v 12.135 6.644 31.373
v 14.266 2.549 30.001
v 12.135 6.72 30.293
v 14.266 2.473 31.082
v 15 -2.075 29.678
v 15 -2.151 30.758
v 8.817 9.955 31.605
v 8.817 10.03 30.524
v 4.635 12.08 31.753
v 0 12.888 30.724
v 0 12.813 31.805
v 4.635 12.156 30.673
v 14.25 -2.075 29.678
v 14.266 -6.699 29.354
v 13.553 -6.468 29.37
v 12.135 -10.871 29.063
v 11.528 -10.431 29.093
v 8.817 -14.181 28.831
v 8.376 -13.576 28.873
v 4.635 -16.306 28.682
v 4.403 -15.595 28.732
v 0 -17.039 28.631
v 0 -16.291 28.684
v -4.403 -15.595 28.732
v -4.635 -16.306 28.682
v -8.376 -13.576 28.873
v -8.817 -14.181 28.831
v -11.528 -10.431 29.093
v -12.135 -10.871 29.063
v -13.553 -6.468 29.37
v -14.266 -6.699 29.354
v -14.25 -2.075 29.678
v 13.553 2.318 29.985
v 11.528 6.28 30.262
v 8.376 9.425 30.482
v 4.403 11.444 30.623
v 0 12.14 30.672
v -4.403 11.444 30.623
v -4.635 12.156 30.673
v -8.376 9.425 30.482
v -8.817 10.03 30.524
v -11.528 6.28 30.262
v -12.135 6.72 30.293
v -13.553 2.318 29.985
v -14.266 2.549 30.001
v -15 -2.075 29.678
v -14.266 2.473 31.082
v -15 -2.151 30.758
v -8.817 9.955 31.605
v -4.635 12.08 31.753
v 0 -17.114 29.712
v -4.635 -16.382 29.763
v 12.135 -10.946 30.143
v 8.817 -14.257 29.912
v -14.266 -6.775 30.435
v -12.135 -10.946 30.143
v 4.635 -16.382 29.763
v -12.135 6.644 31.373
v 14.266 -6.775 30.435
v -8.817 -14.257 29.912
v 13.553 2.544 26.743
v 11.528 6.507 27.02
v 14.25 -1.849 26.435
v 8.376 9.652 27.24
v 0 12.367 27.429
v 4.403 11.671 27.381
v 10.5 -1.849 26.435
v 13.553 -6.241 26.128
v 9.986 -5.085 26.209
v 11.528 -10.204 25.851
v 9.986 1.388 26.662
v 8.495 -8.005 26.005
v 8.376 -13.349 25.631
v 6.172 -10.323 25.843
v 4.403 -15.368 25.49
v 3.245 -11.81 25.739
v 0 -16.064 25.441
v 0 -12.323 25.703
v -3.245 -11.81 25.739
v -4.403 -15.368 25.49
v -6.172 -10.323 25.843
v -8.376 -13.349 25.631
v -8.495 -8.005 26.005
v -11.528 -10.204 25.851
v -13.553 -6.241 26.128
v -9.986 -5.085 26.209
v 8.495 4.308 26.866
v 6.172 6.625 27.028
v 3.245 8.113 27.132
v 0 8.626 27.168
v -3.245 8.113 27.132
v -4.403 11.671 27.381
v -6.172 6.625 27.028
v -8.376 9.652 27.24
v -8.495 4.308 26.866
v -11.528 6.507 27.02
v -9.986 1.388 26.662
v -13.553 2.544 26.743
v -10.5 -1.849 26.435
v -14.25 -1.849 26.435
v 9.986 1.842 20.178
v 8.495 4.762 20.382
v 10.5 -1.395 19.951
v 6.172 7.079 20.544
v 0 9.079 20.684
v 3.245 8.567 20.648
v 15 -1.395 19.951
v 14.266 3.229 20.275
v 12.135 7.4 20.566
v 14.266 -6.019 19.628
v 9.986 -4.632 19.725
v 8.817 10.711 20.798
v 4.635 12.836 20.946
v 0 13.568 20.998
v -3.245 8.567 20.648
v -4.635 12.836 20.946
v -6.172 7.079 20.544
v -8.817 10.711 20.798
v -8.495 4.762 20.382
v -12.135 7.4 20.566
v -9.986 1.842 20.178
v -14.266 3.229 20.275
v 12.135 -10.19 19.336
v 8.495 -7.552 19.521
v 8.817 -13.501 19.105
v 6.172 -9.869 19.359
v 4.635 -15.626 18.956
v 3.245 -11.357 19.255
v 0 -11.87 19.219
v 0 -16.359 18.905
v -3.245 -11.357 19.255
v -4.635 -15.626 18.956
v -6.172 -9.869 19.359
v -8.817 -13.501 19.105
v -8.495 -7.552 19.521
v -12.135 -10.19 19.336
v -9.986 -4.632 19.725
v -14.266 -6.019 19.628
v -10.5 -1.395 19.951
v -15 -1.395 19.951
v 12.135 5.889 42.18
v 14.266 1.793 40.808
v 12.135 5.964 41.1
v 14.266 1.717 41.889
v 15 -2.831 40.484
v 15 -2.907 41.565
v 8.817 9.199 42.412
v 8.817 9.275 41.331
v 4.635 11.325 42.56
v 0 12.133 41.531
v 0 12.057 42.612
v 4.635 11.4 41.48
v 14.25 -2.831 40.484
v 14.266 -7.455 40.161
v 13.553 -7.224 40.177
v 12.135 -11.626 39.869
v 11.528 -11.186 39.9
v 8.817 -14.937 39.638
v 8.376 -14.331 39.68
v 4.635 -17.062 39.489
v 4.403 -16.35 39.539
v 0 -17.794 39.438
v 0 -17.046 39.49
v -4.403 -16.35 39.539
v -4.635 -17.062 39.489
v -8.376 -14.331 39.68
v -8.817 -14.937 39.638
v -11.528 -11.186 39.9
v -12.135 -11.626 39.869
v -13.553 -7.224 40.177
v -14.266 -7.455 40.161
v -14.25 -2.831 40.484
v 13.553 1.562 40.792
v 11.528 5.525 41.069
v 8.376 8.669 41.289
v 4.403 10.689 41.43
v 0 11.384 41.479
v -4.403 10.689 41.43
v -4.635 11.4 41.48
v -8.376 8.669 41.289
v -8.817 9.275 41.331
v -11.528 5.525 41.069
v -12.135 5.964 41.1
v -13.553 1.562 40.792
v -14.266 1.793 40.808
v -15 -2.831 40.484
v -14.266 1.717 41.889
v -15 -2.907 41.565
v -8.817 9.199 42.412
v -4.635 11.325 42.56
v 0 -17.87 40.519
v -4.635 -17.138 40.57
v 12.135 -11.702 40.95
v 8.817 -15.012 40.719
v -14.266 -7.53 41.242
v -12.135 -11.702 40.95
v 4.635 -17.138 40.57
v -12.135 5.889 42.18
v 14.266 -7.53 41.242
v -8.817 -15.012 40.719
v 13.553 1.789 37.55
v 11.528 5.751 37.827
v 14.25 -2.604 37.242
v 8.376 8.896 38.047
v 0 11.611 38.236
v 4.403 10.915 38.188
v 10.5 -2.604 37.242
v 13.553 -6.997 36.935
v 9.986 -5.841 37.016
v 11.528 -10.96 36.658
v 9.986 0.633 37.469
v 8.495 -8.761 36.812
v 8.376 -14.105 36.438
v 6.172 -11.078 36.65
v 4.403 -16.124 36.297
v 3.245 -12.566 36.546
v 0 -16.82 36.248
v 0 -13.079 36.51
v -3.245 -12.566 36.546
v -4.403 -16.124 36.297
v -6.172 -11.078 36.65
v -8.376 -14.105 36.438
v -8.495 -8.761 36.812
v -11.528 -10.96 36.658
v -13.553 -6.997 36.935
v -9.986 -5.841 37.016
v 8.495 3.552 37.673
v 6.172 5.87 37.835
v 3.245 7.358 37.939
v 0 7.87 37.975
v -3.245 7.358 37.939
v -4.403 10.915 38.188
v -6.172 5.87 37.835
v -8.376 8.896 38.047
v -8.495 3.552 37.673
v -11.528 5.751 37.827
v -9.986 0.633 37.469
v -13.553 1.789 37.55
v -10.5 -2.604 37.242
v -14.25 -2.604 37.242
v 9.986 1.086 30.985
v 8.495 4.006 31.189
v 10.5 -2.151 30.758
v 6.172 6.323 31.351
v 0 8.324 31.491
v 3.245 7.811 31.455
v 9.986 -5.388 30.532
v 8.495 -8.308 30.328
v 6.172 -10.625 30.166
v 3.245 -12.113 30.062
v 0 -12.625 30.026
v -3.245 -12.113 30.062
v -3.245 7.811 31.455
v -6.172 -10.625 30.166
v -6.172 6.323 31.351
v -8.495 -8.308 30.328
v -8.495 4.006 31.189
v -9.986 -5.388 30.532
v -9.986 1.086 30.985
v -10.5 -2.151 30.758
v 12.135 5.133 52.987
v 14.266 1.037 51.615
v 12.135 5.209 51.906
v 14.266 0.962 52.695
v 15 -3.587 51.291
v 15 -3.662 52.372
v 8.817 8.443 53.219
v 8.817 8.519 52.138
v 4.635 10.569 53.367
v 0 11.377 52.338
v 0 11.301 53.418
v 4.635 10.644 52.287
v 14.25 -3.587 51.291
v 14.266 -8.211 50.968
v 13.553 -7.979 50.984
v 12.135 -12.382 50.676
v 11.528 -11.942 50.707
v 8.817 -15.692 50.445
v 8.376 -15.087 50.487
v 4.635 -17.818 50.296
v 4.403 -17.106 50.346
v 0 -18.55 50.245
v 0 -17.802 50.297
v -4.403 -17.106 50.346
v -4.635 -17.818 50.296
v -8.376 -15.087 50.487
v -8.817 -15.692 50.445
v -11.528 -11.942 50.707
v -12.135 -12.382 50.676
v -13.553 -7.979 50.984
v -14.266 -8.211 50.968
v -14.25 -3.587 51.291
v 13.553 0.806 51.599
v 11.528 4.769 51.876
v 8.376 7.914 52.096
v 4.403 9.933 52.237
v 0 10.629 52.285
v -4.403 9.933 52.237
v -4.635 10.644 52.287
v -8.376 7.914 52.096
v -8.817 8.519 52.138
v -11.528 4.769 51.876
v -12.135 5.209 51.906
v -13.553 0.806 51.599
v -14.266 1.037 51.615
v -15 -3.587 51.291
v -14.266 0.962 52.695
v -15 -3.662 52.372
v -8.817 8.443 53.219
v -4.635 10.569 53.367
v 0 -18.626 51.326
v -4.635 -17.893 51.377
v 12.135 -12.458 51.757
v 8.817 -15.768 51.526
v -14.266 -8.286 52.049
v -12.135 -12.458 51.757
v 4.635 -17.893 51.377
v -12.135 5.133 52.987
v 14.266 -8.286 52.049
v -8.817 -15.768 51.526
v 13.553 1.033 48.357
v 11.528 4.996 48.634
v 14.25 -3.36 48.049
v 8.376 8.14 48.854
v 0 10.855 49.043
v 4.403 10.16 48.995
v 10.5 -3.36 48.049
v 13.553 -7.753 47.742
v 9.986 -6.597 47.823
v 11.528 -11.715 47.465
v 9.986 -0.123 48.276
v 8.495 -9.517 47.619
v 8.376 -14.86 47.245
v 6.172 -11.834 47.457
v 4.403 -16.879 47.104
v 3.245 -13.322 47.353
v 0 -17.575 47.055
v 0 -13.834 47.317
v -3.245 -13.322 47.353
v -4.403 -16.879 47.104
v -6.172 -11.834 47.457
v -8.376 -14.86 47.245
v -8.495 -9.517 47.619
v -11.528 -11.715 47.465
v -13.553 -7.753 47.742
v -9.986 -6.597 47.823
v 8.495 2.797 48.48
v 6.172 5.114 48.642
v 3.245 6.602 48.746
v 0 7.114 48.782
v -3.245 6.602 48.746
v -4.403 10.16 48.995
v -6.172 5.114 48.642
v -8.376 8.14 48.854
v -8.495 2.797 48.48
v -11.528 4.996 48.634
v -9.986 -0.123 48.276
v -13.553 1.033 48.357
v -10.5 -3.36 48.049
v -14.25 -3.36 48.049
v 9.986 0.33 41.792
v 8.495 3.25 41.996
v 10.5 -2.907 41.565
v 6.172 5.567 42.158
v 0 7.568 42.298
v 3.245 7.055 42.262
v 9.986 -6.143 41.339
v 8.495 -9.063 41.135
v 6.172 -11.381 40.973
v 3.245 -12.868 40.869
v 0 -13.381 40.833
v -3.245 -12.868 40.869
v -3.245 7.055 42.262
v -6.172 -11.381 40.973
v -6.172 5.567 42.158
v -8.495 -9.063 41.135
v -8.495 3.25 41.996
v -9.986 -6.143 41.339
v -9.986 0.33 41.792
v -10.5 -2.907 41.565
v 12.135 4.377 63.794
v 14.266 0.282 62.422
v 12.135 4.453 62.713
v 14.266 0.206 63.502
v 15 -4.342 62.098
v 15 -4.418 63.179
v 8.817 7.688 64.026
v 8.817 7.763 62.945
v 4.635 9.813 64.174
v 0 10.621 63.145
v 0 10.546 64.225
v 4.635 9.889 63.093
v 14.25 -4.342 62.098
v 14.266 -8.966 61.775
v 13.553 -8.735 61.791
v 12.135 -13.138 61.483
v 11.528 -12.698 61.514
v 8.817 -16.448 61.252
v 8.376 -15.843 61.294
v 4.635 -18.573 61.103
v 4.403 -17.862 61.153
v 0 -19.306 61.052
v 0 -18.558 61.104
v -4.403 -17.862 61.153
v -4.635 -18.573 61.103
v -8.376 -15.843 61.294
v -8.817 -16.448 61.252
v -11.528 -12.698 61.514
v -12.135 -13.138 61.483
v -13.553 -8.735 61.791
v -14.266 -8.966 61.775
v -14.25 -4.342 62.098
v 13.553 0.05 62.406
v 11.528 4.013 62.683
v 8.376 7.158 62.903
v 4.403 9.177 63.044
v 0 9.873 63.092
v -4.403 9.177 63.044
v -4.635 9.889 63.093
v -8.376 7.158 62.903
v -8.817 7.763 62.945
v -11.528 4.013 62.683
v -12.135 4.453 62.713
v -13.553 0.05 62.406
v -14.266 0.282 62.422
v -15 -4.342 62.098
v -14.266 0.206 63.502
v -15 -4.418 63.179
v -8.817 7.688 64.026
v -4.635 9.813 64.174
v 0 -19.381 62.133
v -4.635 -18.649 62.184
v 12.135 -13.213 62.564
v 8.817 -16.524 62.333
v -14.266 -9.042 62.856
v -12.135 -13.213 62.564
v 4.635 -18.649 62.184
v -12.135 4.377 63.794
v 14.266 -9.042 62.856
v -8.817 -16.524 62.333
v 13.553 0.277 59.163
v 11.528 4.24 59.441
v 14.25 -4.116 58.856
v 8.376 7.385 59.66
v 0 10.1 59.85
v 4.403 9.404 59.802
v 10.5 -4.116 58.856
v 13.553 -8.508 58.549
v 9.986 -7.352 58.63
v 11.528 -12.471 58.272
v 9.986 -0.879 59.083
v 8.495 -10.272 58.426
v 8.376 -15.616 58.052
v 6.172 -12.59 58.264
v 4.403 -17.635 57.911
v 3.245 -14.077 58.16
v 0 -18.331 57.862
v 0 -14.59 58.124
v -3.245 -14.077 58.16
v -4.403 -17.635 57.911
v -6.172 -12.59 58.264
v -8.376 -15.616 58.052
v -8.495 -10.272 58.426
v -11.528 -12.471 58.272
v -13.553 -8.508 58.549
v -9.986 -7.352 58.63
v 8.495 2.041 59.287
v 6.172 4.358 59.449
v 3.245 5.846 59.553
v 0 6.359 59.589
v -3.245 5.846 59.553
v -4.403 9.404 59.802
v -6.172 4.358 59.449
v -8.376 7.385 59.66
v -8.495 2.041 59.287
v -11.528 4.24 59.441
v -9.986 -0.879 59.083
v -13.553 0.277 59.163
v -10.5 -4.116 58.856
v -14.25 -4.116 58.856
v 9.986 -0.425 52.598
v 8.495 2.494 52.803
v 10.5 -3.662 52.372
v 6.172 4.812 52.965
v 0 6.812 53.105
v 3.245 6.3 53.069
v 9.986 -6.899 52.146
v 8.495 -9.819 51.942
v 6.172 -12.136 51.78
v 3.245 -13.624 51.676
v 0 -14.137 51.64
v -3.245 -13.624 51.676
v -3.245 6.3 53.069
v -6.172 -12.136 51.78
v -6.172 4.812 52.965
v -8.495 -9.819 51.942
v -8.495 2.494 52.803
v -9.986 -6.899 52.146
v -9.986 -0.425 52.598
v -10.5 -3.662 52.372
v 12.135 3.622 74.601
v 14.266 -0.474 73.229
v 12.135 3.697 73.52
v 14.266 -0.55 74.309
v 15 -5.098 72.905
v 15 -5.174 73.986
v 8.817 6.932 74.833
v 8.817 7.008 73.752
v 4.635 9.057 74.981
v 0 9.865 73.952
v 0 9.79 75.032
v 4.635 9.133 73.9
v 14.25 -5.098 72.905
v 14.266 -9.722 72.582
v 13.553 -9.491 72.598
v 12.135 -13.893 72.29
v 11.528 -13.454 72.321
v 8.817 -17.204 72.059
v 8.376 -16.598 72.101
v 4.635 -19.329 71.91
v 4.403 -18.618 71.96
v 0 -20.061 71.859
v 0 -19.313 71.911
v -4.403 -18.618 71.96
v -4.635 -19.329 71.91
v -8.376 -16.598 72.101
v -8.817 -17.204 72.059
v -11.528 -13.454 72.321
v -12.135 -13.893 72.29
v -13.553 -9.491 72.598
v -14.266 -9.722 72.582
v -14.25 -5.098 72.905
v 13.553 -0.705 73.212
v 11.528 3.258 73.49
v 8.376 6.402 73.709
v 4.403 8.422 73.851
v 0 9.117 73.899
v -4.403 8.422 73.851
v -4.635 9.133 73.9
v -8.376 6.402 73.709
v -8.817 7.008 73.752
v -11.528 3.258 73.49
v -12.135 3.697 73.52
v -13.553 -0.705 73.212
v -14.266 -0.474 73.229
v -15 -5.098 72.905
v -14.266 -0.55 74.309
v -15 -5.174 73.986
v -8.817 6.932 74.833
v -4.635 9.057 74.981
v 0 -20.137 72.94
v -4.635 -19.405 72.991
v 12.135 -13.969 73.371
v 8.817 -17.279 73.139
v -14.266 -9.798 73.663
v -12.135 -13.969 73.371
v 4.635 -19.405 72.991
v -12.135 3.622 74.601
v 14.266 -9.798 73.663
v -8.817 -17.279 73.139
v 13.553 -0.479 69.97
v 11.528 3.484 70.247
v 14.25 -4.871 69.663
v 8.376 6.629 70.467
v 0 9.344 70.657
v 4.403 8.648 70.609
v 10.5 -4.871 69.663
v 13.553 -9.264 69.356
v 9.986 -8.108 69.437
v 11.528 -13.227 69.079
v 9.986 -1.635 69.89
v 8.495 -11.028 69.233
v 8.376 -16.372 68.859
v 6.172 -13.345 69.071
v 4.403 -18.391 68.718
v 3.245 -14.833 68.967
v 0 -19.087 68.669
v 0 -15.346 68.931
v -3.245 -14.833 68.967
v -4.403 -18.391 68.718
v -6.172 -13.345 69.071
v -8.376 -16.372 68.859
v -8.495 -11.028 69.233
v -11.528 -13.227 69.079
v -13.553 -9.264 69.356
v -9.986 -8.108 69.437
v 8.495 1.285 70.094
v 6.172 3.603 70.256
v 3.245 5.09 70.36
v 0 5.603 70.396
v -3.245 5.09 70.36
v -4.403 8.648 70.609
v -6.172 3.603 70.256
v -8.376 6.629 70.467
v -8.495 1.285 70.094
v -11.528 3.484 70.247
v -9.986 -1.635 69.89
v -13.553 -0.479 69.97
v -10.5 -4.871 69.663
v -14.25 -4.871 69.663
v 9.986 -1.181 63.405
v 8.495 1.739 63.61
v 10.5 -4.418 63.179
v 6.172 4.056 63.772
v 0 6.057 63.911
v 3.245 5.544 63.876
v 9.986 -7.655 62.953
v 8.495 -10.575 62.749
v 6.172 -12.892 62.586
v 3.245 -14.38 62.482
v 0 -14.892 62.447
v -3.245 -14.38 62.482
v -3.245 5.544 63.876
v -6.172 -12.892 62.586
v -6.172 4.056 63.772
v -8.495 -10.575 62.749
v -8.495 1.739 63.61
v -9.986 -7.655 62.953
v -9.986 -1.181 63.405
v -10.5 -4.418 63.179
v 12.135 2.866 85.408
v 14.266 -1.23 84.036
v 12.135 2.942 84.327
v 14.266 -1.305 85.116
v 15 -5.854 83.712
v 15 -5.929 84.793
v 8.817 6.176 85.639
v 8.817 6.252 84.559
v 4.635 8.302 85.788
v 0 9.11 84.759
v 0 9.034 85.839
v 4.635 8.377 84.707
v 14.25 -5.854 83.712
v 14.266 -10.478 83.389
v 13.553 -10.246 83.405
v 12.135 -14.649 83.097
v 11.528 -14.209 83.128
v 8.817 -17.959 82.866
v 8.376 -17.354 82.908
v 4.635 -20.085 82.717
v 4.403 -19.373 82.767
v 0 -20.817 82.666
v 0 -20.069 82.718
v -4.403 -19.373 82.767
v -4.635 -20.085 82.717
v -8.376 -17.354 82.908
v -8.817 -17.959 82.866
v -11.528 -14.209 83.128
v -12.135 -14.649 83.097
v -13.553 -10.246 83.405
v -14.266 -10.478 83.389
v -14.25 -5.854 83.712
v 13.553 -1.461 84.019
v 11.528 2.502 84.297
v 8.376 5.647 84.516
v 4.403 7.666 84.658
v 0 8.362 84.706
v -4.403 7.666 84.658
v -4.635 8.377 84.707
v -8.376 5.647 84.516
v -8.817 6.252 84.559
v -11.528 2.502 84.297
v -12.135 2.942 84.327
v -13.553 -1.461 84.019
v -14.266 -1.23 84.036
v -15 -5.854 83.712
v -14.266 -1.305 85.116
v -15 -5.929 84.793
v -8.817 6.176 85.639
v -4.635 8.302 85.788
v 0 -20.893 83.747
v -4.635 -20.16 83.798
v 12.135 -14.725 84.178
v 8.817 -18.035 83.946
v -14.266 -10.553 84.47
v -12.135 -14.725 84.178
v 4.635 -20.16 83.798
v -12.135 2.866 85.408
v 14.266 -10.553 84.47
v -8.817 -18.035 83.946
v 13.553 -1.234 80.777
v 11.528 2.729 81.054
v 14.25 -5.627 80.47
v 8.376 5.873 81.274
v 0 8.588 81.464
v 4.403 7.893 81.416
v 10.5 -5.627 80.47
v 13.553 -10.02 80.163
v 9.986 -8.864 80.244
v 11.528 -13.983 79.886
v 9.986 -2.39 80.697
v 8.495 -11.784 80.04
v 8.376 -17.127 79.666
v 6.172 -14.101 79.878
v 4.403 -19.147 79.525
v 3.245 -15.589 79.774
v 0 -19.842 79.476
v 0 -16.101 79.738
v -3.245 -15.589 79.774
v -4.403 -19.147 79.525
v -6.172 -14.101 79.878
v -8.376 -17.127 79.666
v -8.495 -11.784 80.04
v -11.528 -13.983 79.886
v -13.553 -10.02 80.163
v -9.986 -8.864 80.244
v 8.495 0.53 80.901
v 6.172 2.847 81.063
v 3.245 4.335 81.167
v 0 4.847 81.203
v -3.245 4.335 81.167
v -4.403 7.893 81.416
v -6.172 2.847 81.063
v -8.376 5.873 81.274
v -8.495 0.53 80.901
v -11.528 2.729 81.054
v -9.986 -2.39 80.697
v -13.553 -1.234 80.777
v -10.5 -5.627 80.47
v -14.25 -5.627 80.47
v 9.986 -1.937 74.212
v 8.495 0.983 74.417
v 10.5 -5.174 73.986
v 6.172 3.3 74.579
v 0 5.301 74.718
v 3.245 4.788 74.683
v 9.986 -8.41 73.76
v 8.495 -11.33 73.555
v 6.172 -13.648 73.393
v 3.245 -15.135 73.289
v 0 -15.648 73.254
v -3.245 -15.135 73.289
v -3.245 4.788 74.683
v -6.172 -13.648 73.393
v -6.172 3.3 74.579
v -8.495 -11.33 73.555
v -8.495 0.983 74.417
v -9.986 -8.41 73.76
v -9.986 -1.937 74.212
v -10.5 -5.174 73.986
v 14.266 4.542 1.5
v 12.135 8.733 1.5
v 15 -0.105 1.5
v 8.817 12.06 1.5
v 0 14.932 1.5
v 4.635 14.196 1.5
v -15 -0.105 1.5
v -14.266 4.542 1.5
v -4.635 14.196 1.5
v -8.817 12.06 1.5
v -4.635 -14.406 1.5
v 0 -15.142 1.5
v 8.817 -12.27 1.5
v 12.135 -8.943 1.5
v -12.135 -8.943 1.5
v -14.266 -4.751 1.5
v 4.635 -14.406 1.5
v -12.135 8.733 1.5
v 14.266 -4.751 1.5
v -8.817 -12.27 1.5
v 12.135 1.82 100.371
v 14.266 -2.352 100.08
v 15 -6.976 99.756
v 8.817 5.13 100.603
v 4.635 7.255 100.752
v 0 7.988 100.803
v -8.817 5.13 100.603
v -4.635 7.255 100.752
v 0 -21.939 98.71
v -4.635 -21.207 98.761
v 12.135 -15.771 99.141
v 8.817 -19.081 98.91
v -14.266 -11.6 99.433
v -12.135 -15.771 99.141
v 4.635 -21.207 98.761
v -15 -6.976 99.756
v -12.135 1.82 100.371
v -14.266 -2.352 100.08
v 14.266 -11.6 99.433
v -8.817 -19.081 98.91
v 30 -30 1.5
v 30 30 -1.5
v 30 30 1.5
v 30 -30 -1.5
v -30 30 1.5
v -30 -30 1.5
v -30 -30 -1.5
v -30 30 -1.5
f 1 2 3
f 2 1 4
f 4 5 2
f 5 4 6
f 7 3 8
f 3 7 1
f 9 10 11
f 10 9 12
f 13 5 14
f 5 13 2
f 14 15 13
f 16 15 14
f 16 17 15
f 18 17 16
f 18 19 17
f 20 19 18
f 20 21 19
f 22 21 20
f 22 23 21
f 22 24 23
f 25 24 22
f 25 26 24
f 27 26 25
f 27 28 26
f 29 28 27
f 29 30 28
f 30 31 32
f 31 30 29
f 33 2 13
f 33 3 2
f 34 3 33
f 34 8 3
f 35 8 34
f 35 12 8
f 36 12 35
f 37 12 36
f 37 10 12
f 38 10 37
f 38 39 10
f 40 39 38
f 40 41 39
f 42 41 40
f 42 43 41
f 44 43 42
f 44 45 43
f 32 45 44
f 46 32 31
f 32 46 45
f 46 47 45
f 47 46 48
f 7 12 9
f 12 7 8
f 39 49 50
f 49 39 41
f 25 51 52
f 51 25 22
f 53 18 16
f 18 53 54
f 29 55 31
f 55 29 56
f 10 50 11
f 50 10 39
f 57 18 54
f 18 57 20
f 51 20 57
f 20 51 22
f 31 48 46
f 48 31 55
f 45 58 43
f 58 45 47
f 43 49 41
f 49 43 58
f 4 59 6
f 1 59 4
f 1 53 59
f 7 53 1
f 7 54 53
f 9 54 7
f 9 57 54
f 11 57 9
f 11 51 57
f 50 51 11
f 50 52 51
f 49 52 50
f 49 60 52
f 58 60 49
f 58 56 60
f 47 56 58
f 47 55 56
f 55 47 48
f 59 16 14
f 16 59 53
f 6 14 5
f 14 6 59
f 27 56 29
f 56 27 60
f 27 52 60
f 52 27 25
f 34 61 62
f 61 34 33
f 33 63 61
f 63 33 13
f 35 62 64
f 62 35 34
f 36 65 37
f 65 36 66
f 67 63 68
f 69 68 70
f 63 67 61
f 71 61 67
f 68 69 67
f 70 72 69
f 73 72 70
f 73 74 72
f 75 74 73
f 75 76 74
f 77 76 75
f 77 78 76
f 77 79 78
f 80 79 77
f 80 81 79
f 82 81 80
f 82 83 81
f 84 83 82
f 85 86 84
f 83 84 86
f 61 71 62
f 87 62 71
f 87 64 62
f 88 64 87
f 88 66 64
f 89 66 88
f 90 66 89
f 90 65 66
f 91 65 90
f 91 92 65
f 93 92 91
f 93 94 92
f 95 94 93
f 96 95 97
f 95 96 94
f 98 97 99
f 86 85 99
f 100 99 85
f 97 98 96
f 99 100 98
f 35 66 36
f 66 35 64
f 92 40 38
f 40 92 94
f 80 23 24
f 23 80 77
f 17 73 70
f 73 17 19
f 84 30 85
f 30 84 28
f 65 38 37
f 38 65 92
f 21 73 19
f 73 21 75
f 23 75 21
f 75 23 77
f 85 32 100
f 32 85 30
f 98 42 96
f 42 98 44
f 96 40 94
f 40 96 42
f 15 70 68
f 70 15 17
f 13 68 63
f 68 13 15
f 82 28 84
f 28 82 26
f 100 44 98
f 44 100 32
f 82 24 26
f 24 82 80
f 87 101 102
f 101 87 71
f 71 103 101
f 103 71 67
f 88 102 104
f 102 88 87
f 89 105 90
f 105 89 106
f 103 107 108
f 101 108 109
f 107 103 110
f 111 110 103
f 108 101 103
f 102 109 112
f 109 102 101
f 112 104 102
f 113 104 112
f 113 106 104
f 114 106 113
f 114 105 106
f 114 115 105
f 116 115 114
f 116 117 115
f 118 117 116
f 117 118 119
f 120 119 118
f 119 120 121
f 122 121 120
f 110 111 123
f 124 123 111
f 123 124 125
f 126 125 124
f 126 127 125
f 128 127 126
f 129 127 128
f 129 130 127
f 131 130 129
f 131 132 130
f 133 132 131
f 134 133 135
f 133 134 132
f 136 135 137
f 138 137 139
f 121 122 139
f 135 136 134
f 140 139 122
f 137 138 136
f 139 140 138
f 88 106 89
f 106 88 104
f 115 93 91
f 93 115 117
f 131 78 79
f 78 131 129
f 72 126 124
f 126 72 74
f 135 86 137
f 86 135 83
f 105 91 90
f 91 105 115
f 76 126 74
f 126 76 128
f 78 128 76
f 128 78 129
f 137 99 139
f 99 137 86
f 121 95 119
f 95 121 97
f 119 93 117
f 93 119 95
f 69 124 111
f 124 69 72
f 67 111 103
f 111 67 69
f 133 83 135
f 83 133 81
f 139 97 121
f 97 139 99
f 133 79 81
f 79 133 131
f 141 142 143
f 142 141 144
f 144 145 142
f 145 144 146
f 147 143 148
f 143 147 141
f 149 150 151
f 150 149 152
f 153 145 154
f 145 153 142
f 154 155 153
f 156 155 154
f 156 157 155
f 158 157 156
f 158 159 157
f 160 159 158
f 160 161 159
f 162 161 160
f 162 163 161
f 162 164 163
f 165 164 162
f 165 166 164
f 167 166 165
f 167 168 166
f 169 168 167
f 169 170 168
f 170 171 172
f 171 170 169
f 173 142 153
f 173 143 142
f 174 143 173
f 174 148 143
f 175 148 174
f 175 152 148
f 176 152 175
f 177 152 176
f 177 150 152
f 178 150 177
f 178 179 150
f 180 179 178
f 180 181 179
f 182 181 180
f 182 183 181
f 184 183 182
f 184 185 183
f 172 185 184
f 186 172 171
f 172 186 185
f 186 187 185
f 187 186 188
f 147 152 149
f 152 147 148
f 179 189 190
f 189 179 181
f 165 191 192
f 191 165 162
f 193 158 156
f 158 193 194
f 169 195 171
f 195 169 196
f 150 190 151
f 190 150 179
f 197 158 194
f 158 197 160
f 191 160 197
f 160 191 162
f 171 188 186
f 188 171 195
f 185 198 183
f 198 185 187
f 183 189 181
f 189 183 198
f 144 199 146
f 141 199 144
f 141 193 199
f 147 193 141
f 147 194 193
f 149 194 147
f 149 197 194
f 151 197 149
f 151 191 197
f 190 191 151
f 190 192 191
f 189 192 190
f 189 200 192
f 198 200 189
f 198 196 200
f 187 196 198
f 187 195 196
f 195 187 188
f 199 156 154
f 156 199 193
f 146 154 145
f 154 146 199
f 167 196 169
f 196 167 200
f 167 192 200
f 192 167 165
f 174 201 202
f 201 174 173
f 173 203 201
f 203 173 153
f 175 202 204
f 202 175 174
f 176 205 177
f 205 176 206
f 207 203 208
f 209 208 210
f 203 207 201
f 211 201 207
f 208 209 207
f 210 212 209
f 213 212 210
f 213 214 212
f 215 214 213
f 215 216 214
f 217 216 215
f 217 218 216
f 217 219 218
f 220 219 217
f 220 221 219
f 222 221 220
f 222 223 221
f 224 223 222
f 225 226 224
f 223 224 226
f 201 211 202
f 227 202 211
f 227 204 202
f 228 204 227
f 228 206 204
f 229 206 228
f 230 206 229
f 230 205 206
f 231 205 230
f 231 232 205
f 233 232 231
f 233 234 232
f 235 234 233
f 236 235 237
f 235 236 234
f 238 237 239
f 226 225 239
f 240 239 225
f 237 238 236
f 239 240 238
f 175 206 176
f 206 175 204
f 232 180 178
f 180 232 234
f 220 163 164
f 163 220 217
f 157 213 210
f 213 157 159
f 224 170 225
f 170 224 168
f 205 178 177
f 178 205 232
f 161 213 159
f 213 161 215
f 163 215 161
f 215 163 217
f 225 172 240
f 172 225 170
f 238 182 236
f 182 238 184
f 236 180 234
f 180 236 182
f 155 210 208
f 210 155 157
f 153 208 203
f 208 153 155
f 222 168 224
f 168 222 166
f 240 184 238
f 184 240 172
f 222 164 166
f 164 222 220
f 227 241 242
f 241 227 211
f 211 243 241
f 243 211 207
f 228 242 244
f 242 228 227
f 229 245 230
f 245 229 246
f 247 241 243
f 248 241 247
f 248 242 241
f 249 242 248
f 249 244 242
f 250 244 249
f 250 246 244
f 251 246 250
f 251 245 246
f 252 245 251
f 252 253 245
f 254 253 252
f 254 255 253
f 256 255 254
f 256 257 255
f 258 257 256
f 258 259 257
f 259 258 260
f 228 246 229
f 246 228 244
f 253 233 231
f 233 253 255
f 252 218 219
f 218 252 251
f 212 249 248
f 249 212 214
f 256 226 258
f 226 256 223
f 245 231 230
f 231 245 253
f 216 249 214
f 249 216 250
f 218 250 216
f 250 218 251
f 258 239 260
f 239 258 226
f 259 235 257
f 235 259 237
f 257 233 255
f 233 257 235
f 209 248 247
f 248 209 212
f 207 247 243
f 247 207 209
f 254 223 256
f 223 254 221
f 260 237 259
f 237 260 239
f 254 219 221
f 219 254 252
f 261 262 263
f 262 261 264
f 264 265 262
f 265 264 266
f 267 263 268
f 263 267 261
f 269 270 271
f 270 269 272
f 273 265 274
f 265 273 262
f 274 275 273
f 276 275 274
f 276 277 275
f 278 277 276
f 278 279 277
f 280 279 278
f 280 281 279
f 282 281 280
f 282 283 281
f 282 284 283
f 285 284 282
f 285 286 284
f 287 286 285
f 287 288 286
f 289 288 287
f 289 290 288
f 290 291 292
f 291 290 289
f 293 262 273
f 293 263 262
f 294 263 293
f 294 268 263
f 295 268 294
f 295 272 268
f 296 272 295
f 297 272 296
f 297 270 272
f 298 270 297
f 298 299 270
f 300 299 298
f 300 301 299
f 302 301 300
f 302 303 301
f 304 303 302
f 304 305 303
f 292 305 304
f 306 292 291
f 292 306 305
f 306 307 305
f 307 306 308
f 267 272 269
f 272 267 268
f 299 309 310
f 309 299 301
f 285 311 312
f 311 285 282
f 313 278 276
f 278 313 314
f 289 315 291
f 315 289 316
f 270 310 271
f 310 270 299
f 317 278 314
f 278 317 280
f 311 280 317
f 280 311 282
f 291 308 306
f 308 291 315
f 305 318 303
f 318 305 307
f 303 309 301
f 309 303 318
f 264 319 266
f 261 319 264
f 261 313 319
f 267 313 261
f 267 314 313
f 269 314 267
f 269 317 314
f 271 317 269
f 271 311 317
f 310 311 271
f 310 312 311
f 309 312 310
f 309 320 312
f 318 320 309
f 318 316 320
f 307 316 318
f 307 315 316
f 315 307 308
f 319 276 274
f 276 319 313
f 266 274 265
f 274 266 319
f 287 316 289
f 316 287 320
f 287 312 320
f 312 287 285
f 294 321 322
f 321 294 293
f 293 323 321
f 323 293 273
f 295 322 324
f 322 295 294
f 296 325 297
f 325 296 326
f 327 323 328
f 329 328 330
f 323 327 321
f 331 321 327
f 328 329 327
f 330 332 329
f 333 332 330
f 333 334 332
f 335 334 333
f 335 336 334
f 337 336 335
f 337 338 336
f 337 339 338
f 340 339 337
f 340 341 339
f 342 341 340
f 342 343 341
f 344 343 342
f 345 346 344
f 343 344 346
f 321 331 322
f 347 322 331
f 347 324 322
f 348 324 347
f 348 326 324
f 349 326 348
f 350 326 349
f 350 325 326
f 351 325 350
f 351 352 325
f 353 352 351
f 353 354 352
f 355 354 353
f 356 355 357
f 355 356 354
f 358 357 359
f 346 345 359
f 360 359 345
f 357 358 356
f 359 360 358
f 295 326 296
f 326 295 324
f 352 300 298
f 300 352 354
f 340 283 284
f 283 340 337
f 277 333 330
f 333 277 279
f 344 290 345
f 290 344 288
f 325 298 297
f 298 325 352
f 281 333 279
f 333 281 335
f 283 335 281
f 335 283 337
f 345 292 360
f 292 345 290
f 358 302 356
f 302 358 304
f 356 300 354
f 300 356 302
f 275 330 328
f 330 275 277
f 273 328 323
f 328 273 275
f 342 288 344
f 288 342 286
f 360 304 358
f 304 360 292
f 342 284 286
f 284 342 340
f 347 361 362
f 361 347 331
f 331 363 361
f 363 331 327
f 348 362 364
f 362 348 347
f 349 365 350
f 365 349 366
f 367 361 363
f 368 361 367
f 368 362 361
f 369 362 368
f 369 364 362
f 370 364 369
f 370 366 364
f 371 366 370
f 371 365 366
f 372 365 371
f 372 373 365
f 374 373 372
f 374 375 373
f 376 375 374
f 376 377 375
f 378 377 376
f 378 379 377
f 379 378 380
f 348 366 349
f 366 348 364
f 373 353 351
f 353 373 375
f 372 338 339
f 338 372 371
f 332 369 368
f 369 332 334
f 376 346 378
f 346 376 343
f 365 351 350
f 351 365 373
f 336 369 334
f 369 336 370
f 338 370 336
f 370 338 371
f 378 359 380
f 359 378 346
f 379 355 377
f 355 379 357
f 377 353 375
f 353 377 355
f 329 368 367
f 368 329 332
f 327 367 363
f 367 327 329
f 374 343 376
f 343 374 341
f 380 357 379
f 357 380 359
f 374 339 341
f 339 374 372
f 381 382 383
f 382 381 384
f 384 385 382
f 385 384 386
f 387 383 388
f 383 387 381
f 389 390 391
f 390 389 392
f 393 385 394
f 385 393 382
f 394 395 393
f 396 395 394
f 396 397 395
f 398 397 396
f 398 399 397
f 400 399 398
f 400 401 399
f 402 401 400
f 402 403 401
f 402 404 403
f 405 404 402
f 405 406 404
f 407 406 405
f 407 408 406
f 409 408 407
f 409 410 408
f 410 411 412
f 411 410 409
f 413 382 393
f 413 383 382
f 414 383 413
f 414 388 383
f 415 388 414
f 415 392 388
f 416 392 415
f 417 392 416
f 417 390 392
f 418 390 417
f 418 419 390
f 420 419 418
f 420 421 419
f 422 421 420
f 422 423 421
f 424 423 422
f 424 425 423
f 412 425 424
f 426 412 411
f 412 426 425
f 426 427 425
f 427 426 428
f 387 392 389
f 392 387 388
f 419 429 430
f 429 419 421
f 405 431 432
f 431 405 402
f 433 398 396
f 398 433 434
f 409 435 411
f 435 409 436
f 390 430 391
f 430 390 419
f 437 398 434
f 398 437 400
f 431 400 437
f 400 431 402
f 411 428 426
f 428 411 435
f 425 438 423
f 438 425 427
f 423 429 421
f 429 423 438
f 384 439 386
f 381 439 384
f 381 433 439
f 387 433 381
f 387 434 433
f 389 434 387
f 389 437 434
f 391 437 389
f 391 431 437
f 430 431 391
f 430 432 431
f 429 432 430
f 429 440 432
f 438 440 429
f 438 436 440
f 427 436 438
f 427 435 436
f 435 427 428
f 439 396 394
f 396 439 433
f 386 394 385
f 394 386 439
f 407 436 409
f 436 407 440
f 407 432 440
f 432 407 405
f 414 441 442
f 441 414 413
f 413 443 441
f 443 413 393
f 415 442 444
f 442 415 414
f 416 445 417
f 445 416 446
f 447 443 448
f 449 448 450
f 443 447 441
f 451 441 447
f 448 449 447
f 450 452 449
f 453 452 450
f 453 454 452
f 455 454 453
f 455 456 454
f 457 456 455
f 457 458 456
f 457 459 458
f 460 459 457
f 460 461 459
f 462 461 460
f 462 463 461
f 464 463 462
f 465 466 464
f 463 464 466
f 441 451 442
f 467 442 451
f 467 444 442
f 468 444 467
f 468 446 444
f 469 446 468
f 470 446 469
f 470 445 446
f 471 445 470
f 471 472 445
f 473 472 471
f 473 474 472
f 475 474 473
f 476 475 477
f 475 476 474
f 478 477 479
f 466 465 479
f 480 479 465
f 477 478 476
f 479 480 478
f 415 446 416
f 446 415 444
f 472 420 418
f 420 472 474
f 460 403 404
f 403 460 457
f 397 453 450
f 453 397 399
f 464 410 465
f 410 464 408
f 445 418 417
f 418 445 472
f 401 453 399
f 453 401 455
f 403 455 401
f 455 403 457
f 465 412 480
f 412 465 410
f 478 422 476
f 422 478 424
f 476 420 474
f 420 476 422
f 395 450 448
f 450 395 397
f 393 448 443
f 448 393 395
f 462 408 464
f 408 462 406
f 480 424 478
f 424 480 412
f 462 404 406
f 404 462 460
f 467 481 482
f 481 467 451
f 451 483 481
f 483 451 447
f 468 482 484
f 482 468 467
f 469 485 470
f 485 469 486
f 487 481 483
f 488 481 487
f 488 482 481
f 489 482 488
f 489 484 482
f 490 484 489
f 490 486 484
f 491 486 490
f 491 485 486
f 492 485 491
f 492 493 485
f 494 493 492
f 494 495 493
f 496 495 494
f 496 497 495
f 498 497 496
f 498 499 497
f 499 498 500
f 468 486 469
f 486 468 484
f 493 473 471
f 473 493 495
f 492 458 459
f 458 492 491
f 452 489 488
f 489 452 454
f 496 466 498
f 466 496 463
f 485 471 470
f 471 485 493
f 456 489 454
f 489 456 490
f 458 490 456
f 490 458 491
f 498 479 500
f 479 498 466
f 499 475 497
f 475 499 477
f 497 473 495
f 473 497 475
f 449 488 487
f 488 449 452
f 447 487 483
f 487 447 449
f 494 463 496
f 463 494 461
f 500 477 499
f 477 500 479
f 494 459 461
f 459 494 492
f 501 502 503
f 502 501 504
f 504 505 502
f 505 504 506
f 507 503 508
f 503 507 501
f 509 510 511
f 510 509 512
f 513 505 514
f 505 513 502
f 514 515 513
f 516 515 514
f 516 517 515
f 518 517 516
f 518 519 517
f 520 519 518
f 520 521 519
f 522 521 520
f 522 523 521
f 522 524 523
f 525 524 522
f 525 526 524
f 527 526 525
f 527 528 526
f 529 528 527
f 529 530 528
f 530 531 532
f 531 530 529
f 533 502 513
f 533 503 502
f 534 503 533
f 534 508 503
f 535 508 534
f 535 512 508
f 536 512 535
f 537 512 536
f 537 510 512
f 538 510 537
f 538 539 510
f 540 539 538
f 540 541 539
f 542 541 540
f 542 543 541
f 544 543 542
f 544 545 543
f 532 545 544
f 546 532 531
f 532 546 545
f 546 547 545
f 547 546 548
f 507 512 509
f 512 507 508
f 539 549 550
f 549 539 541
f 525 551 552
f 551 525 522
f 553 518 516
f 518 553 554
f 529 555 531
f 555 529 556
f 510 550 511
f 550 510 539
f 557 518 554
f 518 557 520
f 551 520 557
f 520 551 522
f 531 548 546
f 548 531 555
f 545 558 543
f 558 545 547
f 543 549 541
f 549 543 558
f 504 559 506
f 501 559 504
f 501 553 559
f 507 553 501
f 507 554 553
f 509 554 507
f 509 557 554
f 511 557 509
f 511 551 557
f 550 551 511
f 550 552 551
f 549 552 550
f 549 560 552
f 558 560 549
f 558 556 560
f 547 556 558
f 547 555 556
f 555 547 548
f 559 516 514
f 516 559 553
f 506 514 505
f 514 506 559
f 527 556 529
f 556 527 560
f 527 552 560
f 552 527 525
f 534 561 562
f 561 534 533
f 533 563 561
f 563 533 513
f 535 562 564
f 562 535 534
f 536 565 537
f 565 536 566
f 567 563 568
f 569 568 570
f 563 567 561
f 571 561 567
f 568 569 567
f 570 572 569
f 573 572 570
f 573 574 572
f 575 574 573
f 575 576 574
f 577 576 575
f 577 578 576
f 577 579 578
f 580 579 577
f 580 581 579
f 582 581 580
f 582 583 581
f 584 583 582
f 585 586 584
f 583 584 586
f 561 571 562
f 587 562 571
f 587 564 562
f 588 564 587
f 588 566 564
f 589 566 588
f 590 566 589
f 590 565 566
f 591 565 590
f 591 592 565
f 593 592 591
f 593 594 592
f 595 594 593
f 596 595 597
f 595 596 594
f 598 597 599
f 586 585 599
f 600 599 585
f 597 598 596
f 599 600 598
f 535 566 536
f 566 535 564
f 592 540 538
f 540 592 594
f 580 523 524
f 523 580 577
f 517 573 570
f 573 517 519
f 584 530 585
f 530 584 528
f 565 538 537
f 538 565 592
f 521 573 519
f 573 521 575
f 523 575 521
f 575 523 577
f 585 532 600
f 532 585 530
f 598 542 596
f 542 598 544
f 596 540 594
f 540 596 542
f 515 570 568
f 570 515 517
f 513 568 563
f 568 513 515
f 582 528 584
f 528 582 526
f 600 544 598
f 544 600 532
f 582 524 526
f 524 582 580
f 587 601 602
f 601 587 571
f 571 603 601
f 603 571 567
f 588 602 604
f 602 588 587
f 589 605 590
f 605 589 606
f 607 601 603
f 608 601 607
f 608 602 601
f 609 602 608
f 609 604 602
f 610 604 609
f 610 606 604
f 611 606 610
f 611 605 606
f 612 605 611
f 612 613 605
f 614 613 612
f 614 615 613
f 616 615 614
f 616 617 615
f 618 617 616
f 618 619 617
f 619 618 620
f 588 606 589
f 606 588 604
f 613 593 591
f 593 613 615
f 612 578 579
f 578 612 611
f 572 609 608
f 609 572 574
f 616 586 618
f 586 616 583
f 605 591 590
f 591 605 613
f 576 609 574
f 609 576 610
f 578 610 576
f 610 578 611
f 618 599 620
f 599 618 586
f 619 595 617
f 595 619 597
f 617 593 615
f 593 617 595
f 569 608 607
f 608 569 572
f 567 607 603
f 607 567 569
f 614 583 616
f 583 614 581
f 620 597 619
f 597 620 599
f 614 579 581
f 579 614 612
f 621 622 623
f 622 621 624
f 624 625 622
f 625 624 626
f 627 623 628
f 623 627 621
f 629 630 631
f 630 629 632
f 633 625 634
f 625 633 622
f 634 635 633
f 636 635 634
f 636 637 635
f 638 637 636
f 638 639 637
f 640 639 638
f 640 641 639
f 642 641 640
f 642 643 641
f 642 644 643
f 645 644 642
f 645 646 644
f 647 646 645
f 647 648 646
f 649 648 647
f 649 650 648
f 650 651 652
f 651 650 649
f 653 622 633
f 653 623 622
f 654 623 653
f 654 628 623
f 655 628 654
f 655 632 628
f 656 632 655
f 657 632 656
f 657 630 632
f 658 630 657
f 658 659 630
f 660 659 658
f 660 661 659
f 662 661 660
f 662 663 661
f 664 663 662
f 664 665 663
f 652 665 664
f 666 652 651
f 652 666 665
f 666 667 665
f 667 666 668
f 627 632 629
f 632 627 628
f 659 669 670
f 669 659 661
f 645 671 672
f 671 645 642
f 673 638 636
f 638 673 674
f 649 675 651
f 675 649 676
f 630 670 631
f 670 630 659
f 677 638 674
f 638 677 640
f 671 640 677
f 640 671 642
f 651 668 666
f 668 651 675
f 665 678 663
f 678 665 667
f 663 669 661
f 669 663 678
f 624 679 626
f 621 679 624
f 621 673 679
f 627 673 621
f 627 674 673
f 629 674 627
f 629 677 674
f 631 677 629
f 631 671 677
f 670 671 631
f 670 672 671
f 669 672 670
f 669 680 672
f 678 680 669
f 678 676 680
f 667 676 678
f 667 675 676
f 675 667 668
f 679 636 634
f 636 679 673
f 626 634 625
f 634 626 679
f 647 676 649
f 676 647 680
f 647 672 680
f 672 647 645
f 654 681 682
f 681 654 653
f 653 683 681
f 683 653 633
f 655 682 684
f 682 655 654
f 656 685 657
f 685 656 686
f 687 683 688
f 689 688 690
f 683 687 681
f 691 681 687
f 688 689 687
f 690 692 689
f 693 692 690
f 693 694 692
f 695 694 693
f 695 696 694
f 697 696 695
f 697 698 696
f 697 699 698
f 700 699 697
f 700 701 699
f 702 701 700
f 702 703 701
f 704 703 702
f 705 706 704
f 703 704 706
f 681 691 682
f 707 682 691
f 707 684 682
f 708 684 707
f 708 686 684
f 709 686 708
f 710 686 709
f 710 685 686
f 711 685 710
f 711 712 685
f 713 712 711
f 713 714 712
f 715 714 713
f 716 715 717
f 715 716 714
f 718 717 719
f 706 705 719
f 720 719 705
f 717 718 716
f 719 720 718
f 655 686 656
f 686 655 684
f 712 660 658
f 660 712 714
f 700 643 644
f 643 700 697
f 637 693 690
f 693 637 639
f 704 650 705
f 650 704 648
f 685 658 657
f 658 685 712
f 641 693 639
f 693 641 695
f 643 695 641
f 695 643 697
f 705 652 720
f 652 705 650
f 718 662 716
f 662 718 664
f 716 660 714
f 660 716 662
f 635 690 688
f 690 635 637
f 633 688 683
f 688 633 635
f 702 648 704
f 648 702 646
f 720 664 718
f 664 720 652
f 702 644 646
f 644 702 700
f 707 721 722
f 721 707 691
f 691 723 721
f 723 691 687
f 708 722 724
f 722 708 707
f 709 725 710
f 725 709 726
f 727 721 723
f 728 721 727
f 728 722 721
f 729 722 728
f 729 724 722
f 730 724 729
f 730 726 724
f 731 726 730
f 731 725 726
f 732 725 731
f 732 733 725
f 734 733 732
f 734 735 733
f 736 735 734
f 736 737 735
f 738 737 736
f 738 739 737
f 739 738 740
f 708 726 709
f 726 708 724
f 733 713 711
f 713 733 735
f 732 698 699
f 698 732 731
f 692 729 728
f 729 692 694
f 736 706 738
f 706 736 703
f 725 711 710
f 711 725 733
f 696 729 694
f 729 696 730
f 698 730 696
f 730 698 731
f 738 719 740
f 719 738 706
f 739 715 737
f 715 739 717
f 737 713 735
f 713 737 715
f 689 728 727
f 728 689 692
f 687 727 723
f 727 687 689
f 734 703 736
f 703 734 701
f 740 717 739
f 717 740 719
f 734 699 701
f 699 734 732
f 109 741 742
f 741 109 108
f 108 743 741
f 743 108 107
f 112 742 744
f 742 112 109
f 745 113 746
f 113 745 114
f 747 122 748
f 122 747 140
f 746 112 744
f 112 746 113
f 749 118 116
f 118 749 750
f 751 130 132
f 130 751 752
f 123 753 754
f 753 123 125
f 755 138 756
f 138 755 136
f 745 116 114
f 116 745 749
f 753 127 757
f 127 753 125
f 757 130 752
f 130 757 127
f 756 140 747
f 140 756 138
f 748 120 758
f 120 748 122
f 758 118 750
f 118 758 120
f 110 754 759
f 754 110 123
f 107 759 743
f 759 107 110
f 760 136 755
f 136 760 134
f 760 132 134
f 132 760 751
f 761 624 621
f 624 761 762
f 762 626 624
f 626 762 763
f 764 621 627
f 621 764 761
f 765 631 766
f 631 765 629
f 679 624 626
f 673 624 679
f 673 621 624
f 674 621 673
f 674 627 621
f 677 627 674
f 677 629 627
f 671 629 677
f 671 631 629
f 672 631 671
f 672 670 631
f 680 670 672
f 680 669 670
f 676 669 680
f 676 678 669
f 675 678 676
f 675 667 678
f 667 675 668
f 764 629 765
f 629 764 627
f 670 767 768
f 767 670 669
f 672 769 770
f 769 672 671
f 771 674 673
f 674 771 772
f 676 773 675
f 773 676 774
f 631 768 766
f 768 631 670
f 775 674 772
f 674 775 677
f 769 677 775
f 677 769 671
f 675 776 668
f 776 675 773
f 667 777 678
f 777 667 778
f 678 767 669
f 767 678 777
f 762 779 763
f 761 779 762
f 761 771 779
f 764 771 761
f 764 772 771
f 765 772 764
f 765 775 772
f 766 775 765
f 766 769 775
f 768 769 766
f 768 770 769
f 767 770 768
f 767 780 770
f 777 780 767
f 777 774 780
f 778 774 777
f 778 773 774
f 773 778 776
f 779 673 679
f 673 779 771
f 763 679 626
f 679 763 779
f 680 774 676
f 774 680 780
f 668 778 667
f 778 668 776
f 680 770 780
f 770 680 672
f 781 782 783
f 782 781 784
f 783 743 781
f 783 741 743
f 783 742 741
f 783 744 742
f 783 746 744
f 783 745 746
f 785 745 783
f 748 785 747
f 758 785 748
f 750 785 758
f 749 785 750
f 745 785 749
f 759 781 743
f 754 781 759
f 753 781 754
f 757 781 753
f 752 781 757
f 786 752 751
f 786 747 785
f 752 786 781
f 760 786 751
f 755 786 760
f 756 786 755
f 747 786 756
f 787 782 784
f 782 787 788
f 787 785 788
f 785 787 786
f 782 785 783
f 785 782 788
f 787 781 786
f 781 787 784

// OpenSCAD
// file: top.scad
//top.scad v2

module top_section(width, height){
   radius=0.5*width;
   cylinder(h=height, r1=radius, r2=radius);
}
// file: middle.scad
//middle.scad v2

color("white") level(50, 25);

module middle_section(width, height){
   level_height=height/6;
   level_radius=0.5*width;

   for(h=[0:1:5]){
     floor_offset=h*level_height;
       
     translate([0,0,floor_offset]) 
       level(level_radius, level_height);
   }
} 

module level(level_radius, level_height){
    lip_height= 0.1*level_height;
    inner_radius= 0.7*level_radius;
    overhang_height= 0.3*level_height;
    overhang_radius= 0.95*level_radius;
    
    //lip
    translate([0,0,level_height-lip_height])
      cylinder(h=lip_height, r1=level_radius, r2=level_radius);
    
    //overhang
    translate([0,0,0.60*level_height]) 
       cylinder(h=overhang_height,r1=overhang_radius, r2=overhang_radius); 
    
    //inner structure
    cylinder(h=level_height, r1=inner_radius, r2=inner_radius);
}
// file: bottom.scad
//bottom.scad v2

module bottom_section(width, height){
    radius=0.5*width;
    cylinder(h=height, r1=radius, r2=radius);
}
// main file
//tower.scad v2

use <bottom.scad>
use <middle.scad>
use <top.scad>

tower_height= 100;
tower_width= 0.3*tower_height;
bottom_height= 0.2*tower_height;
middle_height= 0.65*tower_height;
top_height= 0.15*tower_height;

base_width= 2*tower_width;
base_height= 0.1*tower_width;

lean_angle= 4;

$fn=20;

rotate([lean_angle,0,0]){
    color("grey") 
        bottom_section(tower_width, bottom_height);
    color("lightgrey") 
        translate([0,0,0.2*tower_height]) 
            middle_section(tower_width, middle_height);
    color("white") 
        translate([0,0,0.85*tower_height]) 
            top_section(tower_width,top_height);
}

color("lightgreen") 
   cube([base_width,base_width,base_height], center=true);
